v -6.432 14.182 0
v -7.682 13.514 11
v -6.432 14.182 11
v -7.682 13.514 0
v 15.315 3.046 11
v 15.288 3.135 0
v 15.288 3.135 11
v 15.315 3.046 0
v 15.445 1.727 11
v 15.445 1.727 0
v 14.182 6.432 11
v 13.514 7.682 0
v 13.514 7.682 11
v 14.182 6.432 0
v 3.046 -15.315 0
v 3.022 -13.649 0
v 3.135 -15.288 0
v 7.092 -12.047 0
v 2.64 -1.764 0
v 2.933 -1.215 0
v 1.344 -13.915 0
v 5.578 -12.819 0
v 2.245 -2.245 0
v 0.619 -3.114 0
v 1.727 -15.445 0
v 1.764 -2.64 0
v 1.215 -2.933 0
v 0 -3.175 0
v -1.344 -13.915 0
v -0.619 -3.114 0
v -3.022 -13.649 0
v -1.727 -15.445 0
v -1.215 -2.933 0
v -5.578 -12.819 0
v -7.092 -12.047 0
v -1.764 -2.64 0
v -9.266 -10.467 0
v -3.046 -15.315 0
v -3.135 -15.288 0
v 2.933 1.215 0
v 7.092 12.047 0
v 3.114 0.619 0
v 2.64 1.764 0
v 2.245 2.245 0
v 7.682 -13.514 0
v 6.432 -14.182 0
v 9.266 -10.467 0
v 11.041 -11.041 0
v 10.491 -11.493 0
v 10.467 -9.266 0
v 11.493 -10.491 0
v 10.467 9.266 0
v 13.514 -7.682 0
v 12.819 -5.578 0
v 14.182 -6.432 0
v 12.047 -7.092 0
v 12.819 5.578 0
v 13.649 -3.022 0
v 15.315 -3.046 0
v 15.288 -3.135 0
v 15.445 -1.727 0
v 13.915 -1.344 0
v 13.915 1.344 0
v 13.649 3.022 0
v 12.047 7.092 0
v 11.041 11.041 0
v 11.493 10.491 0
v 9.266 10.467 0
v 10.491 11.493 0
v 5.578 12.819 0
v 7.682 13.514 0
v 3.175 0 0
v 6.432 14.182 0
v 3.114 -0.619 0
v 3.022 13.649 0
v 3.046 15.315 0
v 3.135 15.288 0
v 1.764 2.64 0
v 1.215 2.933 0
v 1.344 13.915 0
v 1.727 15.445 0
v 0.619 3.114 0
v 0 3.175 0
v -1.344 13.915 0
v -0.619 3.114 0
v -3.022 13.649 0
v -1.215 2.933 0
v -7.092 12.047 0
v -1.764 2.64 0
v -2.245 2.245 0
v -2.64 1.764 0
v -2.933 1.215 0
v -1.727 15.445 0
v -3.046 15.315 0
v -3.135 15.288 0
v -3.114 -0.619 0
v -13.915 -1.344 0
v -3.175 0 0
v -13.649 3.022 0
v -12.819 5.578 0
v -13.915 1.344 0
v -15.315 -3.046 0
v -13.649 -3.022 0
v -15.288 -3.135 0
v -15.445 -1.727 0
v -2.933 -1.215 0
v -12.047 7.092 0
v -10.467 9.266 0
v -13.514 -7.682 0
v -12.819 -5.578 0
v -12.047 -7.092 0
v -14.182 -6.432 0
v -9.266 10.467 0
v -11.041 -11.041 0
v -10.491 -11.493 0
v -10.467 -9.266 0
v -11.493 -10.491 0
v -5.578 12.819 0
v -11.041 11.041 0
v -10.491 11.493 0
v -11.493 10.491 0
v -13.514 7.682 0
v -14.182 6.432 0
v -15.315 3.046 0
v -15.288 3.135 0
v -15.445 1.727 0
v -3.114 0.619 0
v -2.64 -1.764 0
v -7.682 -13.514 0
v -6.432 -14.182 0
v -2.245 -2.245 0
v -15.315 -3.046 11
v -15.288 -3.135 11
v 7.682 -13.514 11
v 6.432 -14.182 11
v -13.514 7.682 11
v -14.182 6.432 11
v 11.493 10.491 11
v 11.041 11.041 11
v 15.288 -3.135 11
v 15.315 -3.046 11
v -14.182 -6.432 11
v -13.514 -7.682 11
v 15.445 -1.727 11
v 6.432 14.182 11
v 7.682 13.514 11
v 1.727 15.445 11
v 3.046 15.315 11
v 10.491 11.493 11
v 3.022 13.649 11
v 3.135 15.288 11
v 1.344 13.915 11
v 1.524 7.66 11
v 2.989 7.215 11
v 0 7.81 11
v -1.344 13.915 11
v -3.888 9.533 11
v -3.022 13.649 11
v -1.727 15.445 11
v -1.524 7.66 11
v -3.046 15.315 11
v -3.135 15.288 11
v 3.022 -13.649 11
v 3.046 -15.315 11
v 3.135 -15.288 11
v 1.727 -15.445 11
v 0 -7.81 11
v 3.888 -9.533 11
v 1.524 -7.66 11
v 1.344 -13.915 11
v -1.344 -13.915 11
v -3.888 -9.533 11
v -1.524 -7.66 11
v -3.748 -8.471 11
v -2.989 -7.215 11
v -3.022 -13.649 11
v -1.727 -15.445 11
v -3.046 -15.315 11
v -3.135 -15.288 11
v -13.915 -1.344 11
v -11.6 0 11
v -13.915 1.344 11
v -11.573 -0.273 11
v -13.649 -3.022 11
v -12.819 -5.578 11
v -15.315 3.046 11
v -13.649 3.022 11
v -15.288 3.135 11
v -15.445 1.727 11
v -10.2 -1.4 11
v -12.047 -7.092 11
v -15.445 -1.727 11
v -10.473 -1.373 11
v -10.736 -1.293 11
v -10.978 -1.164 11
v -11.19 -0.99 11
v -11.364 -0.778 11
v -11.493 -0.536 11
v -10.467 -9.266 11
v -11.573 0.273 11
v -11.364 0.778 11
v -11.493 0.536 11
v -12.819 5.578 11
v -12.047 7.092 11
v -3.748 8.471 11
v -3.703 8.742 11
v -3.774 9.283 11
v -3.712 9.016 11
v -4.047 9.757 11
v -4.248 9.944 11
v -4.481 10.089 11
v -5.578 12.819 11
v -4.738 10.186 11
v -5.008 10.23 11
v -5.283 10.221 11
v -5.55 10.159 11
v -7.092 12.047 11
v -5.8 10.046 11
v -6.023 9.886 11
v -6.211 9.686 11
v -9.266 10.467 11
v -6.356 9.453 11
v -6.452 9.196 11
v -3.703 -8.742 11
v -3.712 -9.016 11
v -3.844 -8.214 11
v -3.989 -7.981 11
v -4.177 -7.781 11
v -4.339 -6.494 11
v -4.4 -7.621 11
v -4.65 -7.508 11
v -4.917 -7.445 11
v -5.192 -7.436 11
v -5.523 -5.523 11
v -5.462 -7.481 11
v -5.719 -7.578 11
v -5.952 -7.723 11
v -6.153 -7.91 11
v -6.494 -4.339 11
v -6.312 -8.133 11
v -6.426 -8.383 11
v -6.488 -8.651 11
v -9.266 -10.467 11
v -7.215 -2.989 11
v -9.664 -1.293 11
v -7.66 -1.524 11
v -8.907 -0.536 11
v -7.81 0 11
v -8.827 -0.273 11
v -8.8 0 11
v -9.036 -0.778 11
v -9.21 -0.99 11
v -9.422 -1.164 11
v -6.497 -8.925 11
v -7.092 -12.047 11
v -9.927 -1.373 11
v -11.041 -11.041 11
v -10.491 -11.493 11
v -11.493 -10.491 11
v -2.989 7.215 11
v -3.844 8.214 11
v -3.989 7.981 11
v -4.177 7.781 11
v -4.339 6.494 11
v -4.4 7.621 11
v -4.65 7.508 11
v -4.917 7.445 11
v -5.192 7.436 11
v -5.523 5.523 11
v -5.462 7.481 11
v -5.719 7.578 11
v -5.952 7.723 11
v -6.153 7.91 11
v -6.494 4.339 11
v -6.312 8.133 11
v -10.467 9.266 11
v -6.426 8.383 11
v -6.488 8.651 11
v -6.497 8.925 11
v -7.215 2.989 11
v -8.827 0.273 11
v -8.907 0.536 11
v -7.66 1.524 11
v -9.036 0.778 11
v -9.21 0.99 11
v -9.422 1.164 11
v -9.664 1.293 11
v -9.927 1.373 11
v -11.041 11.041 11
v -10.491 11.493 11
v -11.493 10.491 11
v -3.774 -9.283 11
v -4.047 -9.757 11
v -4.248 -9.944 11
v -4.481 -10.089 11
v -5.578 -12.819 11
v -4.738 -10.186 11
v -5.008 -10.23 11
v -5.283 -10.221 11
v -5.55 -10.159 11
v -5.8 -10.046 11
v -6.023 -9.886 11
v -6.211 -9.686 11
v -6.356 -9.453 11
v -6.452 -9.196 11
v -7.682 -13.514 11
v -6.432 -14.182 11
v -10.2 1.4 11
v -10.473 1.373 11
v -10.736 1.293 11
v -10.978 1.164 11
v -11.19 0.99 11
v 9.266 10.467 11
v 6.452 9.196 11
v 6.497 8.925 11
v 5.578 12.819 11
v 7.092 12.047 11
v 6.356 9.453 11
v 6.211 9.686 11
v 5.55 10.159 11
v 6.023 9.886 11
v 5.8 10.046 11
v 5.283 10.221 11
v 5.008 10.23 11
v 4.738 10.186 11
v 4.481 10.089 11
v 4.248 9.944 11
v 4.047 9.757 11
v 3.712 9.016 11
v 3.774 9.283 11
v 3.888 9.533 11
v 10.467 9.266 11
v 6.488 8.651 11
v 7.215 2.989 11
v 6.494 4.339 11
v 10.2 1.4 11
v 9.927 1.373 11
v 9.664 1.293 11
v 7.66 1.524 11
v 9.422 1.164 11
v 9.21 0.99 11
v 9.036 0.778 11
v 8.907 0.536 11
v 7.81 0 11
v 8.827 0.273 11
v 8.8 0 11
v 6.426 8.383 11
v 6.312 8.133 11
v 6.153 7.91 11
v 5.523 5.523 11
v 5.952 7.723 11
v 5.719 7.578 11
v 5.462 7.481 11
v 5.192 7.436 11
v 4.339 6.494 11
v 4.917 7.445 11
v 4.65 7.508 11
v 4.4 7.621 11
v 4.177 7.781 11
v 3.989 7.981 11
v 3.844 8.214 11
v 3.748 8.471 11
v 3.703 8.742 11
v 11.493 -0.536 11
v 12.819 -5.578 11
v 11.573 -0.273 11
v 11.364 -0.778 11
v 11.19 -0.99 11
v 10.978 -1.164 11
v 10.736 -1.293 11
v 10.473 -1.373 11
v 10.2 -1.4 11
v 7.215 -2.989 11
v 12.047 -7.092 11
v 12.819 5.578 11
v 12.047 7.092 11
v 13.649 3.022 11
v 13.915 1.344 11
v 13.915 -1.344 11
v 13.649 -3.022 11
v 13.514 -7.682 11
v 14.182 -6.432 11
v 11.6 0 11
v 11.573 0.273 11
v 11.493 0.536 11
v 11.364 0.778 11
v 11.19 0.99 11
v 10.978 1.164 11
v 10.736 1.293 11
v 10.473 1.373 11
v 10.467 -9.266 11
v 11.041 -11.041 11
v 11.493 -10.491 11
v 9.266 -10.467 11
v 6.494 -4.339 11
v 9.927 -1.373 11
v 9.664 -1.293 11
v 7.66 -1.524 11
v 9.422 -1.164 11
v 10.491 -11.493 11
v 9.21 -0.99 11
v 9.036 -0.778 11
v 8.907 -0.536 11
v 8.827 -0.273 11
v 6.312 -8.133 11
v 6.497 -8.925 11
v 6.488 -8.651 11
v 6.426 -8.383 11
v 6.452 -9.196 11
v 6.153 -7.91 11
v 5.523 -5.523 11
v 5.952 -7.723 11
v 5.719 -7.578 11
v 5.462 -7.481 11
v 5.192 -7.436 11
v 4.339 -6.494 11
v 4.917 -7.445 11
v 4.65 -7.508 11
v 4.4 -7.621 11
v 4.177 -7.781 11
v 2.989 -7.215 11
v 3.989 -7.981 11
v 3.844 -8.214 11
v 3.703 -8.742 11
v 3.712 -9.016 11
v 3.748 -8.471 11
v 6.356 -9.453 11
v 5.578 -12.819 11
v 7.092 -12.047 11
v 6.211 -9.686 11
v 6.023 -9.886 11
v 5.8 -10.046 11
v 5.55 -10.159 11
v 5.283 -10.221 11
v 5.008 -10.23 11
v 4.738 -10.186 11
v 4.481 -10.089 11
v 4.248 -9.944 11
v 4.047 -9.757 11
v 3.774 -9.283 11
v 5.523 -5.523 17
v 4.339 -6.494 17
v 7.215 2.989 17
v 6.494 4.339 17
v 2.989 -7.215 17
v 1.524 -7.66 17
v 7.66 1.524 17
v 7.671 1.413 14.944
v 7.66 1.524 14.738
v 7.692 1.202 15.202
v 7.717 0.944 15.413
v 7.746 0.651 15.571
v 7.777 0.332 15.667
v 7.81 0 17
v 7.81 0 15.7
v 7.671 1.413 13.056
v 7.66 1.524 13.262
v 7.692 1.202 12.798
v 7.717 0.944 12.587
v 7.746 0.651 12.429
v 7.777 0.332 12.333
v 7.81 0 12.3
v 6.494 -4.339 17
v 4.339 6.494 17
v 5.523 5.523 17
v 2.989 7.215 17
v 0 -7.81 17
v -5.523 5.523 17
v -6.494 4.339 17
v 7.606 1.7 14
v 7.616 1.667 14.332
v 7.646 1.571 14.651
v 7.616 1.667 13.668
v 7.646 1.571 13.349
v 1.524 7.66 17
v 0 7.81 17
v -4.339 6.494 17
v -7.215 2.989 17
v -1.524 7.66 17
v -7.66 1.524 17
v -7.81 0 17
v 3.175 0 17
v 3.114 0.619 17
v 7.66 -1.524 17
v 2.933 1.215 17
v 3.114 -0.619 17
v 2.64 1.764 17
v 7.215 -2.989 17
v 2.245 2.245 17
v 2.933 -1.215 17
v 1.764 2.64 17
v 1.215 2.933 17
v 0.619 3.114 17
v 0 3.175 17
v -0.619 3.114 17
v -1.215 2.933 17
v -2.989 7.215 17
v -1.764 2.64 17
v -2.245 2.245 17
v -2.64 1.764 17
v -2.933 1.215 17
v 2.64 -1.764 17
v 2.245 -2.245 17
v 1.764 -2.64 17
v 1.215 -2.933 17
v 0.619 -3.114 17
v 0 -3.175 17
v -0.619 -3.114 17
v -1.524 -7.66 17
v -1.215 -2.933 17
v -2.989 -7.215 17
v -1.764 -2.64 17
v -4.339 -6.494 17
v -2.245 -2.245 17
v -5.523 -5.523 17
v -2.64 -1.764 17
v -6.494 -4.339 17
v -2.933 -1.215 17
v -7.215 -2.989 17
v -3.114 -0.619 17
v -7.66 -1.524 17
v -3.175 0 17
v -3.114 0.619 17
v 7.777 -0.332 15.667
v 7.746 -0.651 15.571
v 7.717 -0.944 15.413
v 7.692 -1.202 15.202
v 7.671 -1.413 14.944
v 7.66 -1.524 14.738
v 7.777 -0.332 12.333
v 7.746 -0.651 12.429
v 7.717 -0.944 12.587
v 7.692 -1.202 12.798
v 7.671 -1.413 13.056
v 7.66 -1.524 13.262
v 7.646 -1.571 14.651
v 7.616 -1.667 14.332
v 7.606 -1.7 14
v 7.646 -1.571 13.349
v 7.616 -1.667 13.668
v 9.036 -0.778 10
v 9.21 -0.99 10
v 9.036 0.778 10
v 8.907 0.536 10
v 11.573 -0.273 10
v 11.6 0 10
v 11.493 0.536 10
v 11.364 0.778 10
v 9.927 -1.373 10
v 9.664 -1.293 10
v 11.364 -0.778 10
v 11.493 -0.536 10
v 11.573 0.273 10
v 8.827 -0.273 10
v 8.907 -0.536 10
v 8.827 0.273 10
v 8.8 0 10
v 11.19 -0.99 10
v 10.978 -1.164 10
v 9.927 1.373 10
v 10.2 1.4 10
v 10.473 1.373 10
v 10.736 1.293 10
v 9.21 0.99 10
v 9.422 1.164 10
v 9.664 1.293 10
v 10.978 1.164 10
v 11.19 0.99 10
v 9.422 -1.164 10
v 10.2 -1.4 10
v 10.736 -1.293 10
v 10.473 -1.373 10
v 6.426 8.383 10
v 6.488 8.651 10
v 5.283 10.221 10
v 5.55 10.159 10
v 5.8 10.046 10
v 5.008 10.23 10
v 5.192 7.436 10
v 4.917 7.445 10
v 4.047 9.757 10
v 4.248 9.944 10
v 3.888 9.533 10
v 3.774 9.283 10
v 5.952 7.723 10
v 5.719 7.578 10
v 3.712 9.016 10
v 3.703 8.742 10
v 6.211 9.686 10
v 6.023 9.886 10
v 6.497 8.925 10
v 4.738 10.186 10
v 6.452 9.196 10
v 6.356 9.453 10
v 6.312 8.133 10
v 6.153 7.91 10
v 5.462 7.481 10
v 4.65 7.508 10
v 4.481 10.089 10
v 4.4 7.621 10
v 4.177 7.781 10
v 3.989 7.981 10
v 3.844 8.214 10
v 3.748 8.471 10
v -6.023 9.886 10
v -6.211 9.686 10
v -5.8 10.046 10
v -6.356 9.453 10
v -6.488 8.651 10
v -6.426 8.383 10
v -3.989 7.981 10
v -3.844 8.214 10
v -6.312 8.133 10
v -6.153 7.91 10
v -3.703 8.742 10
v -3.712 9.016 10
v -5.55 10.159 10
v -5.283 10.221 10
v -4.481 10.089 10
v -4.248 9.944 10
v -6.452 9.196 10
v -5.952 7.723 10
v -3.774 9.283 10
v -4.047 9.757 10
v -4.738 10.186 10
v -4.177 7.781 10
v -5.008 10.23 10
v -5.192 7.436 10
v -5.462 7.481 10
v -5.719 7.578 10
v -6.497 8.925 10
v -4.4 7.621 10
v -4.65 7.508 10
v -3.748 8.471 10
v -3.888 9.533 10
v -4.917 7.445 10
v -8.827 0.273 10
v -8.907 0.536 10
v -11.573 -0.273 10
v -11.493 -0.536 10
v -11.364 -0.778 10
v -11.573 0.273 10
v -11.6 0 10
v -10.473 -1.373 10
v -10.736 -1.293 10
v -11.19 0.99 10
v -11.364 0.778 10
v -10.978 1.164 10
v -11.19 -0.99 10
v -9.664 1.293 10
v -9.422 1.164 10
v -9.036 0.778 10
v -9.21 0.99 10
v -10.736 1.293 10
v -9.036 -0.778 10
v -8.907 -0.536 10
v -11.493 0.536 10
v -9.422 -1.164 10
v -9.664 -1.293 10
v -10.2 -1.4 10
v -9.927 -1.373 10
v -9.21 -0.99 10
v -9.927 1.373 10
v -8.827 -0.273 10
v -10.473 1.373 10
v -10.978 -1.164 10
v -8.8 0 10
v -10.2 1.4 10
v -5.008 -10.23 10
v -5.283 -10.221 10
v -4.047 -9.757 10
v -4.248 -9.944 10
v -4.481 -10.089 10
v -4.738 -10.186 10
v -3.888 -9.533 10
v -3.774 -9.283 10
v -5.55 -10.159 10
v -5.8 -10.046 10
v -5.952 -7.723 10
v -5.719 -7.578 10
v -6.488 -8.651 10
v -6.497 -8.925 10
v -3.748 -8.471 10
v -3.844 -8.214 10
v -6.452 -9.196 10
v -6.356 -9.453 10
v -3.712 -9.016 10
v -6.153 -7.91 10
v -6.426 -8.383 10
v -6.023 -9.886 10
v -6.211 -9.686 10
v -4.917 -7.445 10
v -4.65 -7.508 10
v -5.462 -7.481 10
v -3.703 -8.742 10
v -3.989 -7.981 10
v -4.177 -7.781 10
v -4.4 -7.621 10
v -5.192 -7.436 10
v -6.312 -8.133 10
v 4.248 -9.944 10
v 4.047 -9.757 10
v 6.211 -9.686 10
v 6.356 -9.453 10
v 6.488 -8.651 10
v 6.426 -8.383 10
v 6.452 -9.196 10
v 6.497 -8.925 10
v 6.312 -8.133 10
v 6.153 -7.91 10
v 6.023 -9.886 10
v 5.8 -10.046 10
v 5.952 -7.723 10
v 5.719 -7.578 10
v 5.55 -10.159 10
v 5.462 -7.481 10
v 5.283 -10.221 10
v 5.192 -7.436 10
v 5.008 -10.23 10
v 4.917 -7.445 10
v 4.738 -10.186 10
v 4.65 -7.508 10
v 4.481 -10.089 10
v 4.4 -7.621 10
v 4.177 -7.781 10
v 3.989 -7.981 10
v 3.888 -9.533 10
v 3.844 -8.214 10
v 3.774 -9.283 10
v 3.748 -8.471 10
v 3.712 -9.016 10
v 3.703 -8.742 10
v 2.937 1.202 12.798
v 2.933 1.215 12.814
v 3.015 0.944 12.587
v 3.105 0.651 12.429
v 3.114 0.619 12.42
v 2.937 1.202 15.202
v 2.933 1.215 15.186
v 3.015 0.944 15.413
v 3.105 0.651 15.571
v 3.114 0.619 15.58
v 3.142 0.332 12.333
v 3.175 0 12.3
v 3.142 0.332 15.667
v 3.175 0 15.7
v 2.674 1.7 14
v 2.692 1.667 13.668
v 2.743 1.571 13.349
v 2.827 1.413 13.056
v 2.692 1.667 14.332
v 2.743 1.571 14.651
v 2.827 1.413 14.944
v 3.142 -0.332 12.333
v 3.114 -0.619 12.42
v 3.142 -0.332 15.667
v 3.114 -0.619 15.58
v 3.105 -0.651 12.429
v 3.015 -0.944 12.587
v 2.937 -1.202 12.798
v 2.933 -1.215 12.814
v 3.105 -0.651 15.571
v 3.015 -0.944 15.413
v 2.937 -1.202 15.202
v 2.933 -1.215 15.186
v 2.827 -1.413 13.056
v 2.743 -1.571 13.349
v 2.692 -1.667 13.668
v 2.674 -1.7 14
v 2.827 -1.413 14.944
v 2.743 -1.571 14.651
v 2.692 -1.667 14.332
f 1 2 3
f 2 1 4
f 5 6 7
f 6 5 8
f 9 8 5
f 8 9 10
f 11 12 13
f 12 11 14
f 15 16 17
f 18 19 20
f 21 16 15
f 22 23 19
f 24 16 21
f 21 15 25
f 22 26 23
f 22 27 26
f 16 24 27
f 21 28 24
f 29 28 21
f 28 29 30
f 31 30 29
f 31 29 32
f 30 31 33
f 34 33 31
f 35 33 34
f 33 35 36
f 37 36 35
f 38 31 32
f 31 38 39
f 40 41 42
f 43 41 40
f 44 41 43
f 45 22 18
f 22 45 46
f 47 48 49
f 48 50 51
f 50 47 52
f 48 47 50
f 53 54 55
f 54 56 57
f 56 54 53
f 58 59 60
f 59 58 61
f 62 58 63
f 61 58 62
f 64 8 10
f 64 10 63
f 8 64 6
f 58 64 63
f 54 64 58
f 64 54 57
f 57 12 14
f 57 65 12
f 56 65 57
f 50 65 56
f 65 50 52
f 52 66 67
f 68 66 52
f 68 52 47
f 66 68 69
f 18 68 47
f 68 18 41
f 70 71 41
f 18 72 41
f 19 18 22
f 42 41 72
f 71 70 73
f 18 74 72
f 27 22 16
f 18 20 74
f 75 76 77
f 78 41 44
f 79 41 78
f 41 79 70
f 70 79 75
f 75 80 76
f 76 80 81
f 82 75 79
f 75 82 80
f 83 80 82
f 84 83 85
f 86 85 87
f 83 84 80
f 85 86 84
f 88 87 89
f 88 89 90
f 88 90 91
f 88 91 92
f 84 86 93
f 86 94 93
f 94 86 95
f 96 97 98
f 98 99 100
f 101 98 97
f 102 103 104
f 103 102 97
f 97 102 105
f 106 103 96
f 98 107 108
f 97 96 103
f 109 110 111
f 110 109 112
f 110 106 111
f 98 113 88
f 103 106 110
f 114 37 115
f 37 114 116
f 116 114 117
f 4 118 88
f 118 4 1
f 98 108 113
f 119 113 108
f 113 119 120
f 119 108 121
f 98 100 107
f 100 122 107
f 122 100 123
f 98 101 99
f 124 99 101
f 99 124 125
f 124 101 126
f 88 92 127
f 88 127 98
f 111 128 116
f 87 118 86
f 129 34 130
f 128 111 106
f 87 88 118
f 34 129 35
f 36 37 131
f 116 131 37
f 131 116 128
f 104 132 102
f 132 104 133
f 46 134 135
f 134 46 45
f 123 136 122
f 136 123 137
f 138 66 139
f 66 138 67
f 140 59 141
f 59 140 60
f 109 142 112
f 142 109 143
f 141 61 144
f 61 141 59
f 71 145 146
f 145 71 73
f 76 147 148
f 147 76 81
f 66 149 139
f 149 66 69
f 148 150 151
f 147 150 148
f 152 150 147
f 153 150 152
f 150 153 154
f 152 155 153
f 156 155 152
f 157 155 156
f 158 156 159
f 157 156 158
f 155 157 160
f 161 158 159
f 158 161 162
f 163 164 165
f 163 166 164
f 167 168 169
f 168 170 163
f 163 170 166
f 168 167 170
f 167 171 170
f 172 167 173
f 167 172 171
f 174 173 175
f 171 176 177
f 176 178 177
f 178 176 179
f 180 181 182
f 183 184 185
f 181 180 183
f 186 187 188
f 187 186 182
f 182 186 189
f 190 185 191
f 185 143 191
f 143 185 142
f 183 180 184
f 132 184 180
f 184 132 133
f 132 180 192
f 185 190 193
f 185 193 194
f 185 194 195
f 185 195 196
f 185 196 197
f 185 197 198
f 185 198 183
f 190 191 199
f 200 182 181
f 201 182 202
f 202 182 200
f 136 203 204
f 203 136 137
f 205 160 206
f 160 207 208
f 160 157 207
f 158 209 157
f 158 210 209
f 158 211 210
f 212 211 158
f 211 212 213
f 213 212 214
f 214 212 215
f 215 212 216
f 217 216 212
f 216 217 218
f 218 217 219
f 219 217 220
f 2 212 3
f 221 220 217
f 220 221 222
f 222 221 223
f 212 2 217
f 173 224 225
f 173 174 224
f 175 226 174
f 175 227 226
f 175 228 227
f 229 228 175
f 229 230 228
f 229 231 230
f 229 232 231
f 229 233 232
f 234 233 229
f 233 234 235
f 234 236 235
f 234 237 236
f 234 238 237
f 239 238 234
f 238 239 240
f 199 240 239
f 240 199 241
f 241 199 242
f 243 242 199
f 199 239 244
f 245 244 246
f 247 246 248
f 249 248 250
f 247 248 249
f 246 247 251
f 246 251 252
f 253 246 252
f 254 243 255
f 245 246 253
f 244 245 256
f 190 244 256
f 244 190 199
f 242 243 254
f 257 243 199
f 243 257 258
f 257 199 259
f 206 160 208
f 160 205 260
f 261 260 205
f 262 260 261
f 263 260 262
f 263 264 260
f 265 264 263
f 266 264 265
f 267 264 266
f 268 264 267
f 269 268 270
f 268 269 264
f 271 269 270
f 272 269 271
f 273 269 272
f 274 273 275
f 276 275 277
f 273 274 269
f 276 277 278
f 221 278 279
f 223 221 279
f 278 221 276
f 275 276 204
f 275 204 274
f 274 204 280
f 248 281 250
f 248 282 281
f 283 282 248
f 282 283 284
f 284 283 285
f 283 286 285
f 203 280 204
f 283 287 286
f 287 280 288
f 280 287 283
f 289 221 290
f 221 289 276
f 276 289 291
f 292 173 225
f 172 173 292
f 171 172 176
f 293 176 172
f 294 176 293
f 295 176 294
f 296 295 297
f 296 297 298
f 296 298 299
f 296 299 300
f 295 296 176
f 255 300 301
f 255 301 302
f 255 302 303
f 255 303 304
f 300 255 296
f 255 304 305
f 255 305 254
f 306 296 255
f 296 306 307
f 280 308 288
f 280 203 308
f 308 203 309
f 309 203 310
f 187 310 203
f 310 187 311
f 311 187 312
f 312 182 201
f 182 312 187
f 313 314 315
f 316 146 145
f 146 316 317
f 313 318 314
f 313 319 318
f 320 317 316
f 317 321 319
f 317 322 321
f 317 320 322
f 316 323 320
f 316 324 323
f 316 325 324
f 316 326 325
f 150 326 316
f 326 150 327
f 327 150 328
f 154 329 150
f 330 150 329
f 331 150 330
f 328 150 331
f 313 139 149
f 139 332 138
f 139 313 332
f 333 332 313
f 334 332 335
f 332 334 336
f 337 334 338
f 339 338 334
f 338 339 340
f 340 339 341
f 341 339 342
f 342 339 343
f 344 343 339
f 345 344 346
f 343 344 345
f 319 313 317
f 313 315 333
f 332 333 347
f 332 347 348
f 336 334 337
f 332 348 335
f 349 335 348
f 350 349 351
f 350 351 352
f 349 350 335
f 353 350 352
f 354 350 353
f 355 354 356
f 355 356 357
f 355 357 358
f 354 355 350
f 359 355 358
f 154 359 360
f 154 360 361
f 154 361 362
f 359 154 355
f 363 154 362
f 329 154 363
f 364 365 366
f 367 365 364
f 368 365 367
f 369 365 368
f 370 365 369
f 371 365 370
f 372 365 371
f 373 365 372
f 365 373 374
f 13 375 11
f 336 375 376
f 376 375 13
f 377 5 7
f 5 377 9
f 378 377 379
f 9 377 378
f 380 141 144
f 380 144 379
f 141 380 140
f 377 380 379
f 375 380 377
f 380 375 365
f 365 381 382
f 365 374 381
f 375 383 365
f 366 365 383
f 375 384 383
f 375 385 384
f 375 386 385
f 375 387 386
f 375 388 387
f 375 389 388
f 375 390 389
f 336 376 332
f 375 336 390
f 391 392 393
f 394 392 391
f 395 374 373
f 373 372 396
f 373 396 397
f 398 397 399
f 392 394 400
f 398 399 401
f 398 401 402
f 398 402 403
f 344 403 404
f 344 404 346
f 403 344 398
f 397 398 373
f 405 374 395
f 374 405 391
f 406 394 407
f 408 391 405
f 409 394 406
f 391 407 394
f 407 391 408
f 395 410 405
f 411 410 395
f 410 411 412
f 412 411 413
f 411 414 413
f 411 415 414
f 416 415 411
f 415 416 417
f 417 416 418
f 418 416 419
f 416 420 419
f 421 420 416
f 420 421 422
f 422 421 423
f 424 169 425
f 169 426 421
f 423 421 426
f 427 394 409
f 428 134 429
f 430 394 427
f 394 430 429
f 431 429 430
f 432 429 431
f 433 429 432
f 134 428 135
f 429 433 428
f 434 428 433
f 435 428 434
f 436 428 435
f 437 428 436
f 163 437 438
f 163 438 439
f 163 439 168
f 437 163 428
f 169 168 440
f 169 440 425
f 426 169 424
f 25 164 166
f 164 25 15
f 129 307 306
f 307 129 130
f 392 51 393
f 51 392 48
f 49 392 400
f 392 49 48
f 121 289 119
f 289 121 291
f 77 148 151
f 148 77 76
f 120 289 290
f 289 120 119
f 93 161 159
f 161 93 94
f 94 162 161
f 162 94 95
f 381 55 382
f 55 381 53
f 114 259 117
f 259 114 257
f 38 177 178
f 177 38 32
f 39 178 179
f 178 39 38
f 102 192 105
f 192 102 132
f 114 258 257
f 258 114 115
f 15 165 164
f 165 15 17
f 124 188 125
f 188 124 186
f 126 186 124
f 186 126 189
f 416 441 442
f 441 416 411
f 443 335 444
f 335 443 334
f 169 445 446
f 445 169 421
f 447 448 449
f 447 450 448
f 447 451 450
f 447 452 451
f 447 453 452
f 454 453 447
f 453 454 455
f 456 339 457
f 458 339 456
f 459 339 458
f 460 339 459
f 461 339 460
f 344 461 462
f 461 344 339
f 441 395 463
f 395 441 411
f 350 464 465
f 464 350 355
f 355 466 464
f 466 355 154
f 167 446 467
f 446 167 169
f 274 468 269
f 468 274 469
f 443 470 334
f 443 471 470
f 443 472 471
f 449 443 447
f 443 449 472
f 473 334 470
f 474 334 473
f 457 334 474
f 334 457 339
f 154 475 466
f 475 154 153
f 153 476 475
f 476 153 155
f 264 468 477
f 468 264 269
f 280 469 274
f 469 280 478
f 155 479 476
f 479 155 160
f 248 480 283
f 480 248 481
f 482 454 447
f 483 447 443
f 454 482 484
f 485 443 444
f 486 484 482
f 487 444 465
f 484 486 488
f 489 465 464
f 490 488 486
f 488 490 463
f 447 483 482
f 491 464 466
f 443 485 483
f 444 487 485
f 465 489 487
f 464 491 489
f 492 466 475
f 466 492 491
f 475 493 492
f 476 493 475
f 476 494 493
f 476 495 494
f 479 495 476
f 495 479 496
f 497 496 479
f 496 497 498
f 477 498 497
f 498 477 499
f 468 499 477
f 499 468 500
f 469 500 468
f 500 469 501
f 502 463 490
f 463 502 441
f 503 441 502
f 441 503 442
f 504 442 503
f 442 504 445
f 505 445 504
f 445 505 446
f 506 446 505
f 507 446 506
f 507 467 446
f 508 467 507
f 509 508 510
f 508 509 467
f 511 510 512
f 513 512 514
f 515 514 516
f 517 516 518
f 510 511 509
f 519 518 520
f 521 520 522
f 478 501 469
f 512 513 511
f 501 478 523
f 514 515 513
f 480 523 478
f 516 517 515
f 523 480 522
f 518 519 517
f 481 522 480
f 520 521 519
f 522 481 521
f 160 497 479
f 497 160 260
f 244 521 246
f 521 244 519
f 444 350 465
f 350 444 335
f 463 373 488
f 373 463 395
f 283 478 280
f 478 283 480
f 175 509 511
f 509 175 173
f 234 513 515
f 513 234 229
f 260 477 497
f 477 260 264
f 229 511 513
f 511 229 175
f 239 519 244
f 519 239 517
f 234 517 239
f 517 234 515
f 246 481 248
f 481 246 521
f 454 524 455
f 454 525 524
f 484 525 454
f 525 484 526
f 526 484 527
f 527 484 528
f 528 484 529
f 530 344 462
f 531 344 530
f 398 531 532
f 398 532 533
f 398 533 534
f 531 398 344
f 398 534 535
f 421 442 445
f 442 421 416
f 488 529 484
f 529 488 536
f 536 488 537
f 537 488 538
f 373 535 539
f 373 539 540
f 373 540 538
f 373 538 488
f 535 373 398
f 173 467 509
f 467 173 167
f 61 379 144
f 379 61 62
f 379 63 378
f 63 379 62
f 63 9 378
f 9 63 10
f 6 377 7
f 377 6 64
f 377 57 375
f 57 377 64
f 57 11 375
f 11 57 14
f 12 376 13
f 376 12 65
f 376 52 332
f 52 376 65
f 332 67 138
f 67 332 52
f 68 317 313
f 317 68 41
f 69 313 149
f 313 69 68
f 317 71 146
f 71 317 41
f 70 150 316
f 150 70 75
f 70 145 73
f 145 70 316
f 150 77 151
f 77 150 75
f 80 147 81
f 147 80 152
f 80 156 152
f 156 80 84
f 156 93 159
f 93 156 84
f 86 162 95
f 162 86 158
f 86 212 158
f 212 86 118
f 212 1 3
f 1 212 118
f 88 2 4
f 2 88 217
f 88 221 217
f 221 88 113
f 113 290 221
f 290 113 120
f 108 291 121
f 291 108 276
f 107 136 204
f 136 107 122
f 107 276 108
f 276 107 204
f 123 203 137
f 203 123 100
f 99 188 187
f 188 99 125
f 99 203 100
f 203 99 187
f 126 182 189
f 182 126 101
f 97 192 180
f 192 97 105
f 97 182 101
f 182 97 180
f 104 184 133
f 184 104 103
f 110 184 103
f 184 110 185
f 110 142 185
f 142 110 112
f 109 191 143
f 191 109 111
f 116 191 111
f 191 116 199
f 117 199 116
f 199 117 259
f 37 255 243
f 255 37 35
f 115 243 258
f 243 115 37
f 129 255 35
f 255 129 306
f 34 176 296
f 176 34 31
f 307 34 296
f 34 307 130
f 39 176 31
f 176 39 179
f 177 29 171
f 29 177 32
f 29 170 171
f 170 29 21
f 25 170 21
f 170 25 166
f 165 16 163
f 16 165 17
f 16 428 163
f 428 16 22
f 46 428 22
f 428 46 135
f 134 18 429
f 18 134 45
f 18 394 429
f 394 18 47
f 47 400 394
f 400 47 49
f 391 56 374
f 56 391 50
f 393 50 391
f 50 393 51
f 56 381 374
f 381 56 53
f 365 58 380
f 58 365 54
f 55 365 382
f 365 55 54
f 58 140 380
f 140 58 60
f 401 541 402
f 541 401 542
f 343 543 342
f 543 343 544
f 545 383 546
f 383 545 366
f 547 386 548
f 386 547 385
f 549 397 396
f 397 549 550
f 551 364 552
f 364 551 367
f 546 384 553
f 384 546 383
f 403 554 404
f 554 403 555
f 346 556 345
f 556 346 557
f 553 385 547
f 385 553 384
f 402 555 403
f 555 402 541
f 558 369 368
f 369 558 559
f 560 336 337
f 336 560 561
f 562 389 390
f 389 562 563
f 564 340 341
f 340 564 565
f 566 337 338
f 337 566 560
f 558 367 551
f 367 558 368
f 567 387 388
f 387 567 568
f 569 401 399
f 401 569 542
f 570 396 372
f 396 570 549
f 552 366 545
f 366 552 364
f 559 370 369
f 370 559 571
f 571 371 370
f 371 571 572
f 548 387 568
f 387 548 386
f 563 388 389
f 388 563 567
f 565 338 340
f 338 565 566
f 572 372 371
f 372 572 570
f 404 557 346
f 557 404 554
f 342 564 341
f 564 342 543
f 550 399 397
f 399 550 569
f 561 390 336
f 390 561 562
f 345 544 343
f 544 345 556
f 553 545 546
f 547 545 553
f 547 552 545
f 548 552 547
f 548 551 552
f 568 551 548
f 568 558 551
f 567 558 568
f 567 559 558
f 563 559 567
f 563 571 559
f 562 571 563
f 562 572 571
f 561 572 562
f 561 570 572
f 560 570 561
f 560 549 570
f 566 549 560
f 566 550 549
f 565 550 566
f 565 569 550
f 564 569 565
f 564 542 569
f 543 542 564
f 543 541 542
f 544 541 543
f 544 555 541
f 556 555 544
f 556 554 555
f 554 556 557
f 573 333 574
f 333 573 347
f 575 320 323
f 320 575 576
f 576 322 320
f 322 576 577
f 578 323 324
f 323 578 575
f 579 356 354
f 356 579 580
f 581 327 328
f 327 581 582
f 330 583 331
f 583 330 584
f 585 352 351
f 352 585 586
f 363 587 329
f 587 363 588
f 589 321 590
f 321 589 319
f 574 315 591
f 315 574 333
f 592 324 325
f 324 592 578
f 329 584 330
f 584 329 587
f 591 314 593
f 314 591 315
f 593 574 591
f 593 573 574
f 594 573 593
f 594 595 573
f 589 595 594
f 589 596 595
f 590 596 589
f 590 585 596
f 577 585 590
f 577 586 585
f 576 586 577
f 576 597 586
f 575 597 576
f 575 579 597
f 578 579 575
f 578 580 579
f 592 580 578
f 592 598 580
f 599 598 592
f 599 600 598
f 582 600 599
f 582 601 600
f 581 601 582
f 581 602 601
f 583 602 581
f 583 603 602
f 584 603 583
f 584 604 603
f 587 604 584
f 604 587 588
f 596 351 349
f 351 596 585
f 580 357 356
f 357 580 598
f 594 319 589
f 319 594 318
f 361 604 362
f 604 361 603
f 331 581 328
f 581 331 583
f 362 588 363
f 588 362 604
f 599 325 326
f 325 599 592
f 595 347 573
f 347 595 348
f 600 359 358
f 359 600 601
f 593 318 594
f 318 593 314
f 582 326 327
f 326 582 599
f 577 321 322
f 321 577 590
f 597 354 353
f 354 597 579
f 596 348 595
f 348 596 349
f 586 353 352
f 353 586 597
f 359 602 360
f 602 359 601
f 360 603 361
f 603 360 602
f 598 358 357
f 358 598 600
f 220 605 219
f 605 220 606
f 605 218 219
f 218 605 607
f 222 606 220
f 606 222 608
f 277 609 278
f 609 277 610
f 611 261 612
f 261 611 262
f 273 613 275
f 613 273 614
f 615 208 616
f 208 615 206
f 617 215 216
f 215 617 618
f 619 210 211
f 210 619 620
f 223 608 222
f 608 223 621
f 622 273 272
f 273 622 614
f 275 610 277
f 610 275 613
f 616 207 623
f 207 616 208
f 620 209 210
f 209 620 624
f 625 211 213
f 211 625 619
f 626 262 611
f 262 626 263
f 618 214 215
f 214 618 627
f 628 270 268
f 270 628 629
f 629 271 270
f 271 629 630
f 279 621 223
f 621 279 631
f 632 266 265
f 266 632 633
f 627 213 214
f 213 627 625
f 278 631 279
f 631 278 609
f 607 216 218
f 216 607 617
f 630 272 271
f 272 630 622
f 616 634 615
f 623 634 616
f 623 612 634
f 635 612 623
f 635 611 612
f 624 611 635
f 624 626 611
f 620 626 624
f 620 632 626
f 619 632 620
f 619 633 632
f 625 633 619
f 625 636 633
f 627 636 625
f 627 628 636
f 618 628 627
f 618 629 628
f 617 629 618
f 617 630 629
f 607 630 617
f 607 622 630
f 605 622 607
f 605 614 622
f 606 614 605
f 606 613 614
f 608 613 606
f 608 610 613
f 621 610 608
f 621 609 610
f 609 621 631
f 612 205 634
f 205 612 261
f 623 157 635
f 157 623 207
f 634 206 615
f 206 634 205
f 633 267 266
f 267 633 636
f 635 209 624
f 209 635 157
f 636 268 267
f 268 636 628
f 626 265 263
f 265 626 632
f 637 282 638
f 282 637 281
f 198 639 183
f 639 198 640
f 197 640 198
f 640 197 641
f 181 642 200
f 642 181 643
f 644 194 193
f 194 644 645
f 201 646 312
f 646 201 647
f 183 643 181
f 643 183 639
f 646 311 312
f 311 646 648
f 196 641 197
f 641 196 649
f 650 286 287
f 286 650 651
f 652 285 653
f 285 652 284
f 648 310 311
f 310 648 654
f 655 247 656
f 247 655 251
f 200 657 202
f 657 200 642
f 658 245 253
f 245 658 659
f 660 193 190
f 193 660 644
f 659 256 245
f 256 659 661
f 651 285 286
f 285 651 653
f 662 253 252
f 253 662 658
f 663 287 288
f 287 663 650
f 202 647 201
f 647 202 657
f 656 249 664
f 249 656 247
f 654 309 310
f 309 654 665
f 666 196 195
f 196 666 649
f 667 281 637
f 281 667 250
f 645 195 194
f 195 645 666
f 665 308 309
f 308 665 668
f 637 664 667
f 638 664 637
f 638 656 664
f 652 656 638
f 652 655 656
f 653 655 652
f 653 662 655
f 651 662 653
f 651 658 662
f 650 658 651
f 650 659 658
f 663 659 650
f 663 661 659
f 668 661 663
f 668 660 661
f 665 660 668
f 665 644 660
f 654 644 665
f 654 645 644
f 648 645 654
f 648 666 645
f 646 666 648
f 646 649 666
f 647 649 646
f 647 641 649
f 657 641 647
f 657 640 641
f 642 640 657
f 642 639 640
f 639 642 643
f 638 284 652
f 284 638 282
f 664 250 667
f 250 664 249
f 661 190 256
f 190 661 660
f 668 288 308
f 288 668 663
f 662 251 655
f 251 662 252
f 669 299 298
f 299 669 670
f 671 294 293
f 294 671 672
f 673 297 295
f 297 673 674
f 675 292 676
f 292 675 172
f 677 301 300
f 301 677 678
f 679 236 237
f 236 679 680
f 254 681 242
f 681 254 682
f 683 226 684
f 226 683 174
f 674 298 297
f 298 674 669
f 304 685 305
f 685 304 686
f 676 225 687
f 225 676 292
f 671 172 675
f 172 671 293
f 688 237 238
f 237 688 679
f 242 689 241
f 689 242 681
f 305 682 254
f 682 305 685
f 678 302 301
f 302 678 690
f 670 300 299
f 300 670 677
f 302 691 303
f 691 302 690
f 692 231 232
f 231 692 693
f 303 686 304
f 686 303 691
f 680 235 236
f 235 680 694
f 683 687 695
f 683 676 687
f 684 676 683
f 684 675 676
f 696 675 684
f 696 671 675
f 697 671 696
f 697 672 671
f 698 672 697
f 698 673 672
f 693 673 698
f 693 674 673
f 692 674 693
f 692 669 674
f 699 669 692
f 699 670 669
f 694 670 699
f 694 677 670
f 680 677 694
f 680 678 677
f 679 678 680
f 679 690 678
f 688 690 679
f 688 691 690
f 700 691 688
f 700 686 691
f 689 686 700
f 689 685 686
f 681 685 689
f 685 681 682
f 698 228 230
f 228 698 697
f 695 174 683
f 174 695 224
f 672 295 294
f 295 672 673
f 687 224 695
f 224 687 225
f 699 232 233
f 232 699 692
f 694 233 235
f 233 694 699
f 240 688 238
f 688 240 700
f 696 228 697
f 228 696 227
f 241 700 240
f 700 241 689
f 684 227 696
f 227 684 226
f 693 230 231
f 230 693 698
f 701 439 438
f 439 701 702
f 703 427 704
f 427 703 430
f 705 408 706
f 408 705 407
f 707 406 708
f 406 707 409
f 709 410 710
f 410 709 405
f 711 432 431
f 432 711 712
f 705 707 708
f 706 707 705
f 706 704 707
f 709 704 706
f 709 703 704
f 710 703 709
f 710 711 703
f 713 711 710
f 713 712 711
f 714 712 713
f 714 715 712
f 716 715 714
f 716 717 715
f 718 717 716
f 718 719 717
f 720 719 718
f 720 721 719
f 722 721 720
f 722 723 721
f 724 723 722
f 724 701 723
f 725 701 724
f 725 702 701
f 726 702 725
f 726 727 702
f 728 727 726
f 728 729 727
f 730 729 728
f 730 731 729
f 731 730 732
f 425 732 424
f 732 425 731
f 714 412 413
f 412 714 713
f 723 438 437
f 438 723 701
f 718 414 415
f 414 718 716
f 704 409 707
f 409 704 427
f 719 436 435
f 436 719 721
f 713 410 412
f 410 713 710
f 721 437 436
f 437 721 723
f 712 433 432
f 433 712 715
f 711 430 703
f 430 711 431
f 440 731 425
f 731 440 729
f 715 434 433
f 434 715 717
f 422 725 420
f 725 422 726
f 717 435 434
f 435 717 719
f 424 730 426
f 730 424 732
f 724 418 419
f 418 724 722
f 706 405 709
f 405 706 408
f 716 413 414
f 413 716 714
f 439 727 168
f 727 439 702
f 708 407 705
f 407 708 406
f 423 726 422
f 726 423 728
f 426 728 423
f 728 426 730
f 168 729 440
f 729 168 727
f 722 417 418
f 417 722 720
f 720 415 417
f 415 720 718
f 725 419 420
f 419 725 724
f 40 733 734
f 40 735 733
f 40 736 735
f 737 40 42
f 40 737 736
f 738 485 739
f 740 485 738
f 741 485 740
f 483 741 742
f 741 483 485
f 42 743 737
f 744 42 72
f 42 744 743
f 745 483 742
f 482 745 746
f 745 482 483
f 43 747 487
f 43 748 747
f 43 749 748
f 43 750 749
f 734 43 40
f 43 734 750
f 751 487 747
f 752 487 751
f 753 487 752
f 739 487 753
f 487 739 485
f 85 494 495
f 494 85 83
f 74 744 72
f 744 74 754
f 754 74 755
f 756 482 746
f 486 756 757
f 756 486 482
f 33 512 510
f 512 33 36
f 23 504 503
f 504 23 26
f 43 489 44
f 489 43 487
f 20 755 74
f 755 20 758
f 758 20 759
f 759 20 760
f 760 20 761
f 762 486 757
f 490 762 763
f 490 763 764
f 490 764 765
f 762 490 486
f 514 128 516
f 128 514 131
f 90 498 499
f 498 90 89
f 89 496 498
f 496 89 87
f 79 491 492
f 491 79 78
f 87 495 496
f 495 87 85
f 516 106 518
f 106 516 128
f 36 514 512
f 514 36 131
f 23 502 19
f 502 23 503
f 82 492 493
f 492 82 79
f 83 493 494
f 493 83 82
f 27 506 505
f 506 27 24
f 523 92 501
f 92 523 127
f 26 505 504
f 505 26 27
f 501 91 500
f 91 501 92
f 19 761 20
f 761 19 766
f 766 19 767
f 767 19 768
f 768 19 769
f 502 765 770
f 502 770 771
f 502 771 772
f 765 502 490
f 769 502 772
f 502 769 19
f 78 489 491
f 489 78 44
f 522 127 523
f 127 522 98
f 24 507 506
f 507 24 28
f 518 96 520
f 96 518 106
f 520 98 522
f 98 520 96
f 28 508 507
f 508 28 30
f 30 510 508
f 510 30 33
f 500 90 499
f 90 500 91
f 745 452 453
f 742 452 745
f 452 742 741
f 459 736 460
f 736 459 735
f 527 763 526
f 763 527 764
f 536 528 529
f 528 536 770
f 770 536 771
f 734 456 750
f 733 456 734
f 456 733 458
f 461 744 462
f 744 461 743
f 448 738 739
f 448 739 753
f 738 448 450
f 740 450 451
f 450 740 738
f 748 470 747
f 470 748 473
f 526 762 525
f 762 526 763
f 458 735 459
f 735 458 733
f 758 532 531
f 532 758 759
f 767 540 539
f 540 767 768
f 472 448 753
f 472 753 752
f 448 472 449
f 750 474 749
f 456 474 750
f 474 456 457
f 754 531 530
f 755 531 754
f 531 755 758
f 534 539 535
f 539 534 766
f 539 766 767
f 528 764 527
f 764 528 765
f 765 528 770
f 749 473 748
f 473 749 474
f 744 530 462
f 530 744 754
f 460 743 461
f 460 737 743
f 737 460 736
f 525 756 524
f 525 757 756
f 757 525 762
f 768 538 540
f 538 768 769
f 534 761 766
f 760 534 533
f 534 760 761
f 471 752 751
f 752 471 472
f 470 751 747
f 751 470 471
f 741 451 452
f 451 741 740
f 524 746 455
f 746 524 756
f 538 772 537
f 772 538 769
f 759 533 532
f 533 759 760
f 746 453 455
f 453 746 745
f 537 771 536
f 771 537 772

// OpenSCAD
$fn = 32;

// ----------------------------------------------------------------------
// Timing pulley: HTD5 20T, pitch 5 mm, 31.23 mm x 17 mm
// ----------------------------------------------------------------------

// --- parameters (mm) ---
pitch = 5;                // belt pitch
teeth = 20;               // number of grooves
belt_w = 11;              // belt width between the flanges
tip_d = 31.23;            // tip circle diameter
root_d = 29.03;           // groove bottom diameter
groove_h = 1.1;           // groove depth
tooth_w = 3.2;            // groove width at the tip circle
bore_d = 6.35;            // shaft bore
hub_d = 15.62;            // hub diameter
hub_h = 6;                // hub above the flange
bottom_z = 0;             // lowest point of the pulley
top_z = 17;               // highest point of the pulley
set_d = 3.4;              // set screw tap hole
ring_d = 2.8;             // clamp screw hole
ring_r = 10.2;            // clamp screw radius

module rim() {
  cylinder(h = belt_w, d = tip_d);
}

module groove_cutter() {
  /* belt tooth groove: deeper than wide, cut through the belt width */
  translate([root_d / 2, 0, 0])
    linear_extrude(height = belt_w)
      polygon(points = [[-0.6, -tooth_w * 0.42], [groove_h + 0.6, -tooth_w * 0.6],
                        [groove_h + 0.6, tooth_w * 0.6], [-0.6, tooth_w * 0.42]]);
}

module hub() {
  translate([0, 0, bottom_z]) cylinder(h = top_z - bottom_z, d = hub_d);
}

difference() {
  union() {
    rim();
    hub();
  }
  for (i = [0 : teeth - 1]) rotate([0, 0, i * 360 / teeth]) groove_cutter();
  translate([0, 0, bottom_z - 1]) cylinder(h = top_z - bottom_z + 2, d = bore_d);
  translate([-1, 0, top_z - hub_h * 0.5]) rotate([0, 90, 0]) cylinder(h = hub_d / 2 + 3, d = set_d);
  for (i = [0 : 5]) rotate([0, 0, i * 60]) translate([ring_r, 0, top_z - hub_h - 1])
    cylinder(h = hub_h + 2, d = ring_d);
}
